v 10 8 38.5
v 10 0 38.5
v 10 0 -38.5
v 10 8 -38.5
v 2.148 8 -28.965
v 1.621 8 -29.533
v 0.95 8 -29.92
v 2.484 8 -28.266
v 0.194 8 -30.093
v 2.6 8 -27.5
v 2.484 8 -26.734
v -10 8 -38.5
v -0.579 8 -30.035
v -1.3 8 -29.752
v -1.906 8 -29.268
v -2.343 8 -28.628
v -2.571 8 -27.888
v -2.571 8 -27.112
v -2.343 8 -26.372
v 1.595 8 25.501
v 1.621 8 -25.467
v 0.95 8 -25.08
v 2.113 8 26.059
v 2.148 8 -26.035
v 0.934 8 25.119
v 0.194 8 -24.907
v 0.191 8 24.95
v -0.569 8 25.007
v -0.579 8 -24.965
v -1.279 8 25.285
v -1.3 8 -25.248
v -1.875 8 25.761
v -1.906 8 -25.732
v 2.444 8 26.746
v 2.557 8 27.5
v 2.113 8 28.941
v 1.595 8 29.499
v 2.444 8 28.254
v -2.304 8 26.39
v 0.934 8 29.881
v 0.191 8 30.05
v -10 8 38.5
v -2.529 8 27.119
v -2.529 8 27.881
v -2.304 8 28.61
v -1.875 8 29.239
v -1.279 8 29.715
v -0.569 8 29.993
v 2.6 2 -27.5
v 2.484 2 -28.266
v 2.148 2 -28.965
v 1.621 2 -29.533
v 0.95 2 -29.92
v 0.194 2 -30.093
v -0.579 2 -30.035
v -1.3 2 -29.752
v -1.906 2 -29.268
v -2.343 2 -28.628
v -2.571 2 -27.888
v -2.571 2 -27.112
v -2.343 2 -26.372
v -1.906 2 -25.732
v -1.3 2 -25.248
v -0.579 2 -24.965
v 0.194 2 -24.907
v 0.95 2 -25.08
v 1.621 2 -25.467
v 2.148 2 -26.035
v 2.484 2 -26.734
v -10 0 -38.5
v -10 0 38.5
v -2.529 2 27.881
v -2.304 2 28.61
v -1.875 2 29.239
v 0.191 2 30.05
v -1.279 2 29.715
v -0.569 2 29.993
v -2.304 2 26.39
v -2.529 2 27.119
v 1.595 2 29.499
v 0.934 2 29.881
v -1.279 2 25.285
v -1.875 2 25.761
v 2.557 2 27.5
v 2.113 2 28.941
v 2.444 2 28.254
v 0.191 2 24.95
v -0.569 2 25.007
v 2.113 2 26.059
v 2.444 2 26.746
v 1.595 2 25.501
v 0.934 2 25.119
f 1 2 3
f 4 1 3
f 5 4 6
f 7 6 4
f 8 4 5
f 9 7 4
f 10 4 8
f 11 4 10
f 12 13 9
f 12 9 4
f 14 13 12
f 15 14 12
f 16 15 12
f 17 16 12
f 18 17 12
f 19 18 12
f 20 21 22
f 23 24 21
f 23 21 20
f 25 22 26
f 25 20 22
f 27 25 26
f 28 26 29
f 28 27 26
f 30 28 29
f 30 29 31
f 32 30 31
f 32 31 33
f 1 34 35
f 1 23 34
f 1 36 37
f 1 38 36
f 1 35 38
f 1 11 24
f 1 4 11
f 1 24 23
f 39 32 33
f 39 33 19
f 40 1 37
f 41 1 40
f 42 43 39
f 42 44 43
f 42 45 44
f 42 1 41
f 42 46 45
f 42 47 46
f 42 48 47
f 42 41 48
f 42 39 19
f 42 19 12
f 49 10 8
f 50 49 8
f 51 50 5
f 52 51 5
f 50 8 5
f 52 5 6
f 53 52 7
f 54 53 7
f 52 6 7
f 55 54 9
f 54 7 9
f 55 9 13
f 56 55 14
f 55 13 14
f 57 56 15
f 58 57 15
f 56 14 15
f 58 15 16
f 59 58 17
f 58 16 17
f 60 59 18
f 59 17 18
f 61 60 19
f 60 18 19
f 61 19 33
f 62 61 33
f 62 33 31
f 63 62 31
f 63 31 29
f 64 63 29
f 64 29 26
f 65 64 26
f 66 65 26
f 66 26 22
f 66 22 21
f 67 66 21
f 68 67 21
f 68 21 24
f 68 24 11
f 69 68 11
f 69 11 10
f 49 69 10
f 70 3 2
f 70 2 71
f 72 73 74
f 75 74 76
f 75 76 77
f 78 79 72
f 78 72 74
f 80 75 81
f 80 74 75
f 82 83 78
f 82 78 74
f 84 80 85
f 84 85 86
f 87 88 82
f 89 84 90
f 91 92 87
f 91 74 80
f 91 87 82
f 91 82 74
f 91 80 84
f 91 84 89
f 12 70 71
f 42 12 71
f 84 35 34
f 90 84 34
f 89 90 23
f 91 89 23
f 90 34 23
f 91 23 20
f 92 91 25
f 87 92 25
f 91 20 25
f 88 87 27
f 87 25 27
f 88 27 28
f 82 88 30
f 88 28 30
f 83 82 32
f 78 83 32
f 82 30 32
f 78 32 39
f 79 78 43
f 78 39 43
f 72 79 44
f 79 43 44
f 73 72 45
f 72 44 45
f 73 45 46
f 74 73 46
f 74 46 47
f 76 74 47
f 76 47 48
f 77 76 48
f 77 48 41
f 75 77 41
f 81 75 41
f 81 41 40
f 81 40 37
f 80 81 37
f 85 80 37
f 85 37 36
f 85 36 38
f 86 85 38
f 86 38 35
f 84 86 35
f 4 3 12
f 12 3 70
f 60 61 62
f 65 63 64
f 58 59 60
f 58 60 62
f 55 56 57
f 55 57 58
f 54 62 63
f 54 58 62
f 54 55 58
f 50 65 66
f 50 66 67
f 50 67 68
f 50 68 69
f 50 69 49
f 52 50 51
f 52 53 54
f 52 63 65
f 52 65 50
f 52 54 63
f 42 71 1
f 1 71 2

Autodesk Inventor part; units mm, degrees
ref_plane "YZ Plane" through (0, 0, 0) normal (1, 0, 0) x (0, 1, 0)
ref_plane "XZ Plane" through (0, 0, 0) normal (0, 1, 0) x (-1, 0, 0)
ref_plane "XY Plane" through (0, 0, 0) normal (0, 0, 1) x (1, 0, 0)
sketch "Sketch1" plane through (0, 0, 0) normal (0, 1, 0) x (-1, 0, 0)
  line L0 (10, 38.5) -> (-10, 38.5)
  line L1 (-10, 38.5) -> (-10, -38.5)
  line L2 (-10, -38.5) -> (10, -38.5)
  line L3 (10, -38.5) -> (10, 38.5)
  line L4 (10, 38.5) -> (-10, -38.5) construction
  line L5 (-10, 38.5) -> (10, -38.5) construction
  point P0 (0, 0)
  dimension "d0" = 77
  dimension "d1" = 20
extrude "Extrusion1" add sketch "Sketch1" along normal blind 8
sketch "Sketch3" plane through (0, 8, 0) normal (0, 1, 0) x (1, 0, 0)
  circle A0 centre (0, -27.5) radius 2.5574
  circle A1 centre (0, 27.5) radius 2.6
  point P0 (0, 0)
  dimension "d8" = 5.2
  dimension "d9" = 55
  dimension "d10" = 27.5
extrude "Extrusion2" cut sketch "Sketch3" against normal blind 6
thread "Thread1" size "M5.5x0.5" class "6H" standard "ANSI Metric M Profile" full length
thread "Thread2" size "M5.5x0.5" class "6H" standard "ANSI Metric M Profile" full length
properties part number "Spannbacke(n)"
